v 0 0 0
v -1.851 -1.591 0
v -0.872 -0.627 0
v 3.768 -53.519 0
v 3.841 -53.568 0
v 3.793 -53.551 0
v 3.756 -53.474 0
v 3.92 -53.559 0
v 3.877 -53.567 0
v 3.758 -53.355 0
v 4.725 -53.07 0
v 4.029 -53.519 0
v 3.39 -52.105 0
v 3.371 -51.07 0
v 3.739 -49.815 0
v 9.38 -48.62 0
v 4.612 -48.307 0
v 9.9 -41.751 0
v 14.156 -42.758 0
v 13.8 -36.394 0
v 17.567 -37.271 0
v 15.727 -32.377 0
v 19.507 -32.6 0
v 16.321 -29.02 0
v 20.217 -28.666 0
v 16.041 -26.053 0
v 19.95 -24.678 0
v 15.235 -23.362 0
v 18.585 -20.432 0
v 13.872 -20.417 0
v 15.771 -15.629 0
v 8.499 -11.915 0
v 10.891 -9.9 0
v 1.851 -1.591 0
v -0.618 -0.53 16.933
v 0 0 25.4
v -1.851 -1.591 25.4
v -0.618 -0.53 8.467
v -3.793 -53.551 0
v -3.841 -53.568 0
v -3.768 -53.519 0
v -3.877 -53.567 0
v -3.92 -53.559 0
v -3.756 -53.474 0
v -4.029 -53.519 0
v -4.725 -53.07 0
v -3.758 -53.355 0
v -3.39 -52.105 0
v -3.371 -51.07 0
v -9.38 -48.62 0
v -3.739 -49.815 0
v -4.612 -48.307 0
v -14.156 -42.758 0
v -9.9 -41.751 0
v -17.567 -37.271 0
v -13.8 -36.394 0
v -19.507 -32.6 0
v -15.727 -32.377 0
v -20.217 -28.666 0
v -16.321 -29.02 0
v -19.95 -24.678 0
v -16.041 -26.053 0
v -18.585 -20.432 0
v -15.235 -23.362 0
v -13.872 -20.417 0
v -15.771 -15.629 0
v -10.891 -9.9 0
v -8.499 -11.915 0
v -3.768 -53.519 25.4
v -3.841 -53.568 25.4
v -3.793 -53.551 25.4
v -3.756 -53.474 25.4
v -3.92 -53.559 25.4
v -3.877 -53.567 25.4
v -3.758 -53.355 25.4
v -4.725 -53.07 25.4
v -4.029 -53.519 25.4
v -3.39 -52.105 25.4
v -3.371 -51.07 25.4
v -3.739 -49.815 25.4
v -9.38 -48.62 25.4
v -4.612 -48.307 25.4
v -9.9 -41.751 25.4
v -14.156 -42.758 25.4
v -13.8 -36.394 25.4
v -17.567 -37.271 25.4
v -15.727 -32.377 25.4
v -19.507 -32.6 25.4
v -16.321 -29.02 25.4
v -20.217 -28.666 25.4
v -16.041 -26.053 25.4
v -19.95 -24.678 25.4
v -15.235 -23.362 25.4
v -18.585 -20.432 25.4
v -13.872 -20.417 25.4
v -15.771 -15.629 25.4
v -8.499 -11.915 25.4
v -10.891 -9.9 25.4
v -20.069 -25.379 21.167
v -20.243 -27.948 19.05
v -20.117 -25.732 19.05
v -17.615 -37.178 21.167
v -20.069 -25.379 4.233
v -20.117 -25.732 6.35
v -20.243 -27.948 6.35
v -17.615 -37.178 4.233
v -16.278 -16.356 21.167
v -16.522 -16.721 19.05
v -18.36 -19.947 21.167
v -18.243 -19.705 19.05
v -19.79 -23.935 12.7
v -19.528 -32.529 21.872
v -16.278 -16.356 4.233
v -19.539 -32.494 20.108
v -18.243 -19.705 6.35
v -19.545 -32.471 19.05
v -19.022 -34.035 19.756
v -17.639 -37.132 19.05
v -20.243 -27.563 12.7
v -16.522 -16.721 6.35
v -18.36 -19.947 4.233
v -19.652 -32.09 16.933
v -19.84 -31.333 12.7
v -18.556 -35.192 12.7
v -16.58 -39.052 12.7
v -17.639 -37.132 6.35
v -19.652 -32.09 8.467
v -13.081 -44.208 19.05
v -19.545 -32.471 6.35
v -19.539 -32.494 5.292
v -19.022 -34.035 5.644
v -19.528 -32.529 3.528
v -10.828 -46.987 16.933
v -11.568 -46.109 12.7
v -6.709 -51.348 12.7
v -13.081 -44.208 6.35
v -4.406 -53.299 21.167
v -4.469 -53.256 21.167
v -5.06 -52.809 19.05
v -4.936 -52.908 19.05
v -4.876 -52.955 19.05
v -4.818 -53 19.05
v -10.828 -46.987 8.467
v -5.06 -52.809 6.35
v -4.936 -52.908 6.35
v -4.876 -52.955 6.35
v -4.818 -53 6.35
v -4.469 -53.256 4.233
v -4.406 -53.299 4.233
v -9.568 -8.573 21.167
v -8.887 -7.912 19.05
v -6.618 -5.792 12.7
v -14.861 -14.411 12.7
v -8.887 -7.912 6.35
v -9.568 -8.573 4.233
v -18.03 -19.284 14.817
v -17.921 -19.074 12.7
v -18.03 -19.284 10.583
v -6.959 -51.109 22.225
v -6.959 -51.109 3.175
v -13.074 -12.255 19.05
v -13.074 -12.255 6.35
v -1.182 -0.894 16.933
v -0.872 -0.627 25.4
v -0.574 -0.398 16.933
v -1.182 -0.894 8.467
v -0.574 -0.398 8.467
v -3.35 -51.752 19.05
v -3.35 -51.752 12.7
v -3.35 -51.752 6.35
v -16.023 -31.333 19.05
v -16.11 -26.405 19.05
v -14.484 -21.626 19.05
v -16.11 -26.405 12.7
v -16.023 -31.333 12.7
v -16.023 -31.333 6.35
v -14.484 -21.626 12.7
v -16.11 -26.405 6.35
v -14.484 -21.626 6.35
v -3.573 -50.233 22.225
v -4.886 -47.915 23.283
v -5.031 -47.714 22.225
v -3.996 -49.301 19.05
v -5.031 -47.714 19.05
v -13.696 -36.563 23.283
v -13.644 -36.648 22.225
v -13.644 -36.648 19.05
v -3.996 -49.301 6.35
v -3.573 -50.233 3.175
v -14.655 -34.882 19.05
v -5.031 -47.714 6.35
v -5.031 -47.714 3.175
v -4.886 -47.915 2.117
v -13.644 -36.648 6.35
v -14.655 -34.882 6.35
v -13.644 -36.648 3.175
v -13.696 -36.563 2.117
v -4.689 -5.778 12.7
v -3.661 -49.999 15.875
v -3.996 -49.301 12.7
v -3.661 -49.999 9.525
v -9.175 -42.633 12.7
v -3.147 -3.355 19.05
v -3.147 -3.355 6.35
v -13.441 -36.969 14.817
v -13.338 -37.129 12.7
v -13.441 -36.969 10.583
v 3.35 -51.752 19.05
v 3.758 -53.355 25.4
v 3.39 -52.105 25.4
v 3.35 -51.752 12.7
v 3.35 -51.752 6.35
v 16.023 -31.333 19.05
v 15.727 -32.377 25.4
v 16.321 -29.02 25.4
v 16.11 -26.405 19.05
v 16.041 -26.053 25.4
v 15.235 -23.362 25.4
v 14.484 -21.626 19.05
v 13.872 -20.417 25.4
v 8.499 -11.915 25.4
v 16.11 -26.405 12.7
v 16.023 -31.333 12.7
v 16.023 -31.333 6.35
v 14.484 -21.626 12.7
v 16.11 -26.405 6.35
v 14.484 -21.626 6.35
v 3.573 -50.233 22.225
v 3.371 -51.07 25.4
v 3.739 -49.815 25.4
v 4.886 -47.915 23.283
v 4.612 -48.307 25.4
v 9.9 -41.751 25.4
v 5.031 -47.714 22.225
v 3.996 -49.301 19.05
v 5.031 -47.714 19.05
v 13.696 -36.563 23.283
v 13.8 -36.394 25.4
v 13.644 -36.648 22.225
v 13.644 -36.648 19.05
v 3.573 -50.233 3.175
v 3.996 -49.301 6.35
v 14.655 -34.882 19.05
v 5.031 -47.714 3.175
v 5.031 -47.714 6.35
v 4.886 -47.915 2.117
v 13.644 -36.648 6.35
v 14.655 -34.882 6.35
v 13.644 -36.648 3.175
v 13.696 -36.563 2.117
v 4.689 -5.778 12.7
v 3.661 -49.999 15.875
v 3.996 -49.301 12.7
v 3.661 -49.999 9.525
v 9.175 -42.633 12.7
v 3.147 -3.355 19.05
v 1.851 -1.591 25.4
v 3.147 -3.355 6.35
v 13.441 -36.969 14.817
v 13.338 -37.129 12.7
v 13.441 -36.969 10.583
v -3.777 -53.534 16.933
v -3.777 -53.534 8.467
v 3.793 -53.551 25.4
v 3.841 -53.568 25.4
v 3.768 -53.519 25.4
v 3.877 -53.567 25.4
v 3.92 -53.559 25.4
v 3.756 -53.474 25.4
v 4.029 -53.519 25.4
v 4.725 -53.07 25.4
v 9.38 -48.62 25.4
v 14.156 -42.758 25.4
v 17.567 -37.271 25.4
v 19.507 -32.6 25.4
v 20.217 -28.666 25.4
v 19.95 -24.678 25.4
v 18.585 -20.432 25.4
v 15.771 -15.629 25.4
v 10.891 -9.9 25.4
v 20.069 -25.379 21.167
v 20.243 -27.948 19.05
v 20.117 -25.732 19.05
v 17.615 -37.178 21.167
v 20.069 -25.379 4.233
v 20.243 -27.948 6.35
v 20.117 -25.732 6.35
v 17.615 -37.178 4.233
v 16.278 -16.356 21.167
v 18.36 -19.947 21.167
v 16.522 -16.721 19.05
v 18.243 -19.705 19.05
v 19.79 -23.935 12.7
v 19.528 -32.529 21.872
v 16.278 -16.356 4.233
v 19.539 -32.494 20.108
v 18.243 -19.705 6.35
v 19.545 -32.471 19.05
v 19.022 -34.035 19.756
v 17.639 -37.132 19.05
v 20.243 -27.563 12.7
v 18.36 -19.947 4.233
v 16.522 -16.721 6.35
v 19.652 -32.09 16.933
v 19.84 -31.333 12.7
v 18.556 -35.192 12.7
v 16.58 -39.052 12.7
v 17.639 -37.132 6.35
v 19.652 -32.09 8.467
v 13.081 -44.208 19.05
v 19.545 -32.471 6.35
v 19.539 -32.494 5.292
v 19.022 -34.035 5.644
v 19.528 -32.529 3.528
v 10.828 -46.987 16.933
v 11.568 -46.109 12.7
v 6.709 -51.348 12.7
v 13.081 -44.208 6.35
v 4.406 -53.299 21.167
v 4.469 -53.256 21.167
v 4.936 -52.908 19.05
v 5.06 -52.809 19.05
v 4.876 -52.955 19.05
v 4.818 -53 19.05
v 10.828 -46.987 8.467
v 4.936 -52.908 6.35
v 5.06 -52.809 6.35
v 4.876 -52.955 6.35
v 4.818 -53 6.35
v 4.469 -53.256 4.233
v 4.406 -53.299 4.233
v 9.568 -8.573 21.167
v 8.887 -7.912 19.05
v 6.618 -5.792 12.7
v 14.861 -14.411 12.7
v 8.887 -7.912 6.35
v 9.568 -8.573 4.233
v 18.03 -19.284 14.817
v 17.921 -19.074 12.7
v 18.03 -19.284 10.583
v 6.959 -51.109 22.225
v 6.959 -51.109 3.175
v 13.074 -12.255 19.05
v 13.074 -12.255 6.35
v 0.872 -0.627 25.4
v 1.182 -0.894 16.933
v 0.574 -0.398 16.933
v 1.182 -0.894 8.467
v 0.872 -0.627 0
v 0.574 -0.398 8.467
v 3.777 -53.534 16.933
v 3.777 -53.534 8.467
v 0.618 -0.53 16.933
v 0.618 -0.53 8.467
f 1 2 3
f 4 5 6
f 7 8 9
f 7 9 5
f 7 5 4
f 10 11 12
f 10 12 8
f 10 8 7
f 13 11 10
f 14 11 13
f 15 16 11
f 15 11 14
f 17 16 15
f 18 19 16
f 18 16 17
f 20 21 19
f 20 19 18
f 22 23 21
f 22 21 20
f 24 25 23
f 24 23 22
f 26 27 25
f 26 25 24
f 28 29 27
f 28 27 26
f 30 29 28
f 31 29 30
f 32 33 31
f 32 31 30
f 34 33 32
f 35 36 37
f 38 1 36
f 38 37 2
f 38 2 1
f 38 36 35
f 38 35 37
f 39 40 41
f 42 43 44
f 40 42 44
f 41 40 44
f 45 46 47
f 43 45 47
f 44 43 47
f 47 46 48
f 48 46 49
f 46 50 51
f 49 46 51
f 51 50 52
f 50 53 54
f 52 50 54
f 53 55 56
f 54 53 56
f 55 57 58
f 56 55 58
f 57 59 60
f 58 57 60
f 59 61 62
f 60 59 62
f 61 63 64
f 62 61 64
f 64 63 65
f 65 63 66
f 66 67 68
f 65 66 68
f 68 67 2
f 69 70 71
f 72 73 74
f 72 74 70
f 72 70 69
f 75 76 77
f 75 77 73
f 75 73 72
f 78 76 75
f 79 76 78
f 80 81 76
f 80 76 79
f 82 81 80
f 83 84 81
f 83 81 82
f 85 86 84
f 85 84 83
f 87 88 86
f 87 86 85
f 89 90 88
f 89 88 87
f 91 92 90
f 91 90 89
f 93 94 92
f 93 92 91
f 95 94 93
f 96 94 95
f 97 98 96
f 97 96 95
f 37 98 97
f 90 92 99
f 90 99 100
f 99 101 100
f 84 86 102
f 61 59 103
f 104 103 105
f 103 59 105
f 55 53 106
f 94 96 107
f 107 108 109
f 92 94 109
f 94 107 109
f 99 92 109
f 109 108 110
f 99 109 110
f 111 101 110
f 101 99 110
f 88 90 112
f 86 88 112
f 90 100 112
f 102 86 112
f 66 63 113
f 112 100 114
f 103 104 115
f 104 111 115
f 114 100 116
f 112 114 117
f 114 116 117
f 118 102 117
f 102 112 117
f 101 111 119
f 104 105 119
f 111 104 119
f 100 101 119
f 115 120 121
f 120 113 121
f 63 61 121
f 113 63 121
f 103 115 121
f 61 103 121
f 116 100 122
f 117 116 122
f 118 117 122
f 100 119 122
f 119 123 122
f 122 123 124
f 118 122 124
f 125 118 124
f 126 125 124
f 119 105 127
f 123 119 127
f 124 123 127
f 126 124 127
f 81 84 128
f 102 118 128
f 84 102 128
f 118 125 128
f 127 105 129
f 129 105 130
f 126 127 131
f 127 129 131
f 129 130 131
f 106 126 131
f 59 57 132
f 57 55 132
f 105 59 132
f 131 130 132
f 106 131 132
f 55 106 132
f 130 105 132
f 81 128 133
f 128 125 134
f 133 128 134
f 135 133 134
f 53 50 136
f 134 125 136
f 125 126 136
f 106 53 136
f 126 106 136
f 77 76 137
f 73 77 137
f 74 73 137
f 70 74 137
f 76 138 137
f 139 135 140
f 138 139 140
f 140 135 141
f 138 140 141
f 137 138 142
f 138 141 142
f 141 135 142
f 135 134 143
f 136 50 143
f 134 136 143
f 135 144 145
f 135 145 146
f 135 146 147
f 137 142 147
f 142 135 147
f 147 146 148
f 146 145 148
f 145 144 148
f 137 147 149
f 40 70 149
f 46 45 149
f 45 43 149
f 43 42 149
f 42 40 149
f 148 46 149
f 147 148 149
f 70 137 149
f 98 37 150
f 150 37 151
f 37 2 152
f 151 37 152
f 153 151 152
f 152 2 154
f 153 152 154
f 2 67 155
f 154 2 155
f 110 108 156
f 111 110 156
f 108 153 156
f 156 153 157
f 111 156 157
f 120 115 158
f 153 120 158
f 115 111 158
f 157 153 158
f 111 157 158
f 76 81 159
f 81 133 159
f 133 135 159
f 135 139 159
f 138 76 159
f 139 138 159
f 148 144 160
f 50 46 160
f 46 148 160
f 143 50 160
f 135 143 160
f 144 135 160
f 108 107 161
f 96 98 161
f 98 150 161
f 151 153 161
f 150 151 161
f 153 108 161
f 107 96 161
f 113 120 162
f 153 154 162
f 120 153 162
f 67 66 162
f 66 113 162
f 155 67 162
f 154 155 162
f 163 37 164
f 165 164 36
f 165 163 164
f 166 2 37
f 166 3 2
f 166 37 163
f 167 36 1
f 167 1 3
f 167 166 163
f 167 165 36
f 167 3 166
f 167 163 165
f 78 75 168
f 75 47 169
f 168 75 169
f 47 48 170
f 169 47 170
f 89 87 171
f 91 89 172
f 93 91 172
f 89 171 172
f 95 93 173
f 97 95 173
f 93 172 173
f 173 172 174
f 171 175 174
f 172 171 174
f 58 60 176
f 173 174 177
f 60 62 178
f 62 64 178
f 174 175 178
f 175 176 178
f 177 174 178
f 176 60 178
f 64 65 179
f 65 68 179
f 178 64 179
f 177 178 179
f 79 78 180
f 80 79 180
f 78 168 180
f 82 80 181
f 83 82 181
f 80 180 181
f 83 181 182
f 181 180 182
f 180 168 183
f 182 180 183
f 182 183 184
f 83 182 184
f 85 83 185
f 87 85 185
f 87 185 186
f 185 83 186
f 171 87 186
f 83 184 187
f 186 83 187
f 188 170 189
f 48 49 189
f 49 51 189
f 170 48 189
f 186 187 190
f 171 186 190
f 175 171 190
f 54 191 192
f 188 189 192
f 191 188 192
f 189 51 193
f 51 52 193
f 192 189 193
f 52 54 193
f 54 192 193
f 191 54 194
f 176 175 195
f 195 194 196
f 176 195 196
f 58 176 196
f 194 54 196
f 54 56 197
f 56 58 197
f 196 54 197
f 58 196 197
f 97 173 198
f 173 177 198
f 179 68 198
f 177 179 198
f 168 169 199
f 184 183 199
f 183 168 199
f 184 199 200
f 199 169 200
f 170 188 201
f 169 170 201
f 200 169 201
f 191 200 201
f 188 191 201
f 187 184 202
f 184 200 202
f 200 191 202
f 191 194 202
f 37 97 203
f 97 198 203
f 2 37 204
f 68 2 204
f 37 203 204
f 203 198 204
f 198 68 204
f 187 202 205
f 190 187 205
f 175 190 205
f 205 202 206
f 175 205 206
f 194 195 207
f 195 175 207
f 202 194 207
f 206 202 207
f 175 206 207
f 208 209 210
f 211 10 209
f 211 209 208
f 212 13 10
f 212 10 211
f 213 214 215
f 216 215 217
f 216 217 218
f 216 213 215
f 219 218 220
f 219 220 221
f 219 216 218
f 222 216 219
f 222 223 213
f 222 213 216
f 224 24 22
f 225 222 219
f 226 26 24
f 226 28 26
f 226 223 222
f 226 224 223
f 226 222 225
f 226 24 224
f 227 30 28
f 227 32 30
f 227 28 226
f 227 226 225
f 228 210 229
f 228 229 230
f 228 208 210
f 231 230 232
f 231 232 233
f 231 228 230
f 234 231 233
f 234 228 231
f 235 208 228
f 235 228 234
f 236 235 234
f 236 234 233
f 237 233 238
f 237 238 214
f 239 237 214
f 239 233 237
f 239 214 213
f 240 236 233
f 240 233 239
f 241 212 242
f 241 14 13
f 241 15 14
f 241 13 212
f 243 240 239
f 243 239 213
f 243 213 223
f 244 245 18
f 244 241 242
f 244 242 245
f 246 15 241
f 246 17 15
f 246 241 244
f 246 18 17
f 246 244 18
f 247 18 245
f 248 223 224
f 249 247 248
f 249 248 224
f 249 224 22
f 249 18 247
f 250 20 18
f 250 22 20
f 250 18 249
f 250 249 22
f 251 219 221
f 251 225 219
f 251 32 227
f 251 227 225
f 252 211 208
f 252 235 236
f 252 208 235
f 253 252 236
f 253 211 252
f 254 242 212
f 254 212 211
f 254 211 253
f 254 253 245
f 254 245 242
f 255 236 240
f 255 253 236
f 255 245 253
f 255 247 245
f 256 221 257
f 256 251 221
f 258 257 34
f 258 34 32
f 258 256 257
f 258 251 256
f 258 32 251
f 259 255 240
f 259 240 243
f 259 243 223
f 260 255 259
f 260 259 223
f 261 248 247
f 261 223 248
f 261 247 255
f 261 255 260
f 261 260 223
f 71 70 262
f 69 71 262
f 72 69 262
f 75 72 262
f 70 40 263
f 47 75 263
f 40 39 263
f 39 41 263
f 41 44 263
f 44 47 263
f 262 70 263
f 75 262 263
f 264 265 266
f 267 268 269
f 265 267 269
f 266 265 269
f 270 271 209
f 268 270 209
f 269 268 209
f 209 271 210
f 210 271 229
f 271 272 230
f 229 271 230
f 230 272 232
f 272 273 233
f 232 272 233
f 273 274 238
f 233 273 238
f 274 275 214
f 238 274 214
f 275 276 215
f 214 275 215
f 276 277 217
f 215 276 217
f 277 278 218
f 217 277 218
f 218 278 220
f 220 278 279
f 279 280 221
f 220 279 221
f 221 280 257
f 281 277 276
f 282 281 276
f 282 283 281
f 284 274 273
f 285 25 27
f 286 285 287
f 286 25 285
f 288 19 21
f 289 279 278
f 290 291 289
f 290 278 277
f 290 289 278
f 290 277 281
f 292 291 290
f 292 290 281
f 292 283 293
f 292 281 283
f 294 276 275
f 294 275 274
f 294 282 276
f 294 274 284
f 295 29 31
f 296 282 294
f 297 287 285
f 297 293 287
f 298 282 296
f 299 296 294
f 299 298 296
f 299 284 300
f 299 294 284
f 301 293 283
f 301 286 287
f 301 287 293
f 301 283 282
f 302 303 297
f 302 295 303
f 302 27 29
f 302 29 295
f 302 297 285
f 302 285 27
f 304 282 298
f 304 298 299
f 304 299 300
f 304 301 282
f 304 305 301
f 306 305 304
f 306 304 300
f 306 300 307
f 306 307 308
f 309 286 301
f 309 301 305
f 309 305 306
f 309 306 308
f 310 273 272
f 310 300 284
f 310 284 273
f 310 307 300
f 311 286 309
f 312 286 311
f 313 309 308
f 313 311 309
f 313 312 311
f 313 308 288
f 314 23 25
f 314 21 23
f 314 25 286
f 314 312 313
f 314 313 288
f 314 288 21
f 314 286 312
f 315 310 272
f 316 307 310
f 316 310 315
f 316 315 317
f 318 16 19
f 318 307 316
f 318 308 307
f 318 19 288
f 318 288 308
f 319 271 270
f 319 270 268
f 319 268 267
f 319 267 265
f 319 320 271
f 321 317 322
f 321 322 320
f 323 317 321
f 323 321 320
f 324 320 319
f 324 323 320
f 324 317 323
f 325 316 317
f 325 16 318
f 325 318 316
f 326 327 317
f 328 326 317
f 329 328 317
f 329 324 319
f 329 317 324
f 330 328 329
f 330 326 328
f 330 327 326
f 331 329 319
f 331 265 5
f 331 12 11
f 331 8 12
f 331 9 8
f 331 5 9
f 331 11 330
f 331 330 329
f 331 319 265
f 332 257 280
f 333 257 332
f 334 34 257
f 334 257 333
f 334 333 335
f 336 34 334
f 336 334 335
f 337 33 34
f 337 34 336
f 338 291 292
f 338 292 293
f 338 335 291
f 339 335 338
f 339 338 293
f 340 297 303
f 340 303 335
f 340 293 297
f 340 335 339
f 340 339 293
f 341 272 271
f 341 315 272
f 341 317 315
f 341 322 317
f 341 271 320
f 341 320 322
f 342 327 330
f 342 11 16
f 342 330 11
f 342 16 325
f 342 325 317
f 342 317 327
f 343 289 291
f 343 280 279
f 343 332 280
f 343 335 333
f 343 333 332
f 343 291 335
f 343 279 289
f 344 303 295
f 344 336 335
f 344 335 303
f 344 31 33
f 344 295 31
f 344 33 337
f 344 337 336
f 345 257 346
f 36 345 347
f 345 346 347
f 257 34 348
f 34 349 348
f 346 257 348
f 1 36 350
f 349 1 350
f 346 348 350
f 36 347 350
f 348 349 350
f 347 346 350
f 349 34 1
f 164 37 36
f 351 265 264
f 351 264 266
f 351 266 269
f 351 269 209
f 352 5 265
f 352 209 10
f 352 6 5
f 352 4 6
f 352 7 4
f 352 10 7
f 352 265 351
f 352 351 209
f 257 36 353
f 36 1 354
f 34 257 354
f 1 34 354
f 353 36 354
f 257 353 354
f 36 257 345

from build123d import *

# Parameters (mm, degrees)
F1_DEPTH = 25.4


with BuildPart() as f1:
    # F0 (on Top) → F1 (new body)
    with BuildSketch(Plane.XY):
        with BuildLine():
            add(Edge.make_bspline(
                [(-3.7579423769, -53.3547353565), (-3.370457975, -52.3431925798), (-2.2307136518, -48.6091596866), (-22.7083935356, -31.2772210218), (-8.7878689347, -13.2919078478), (-3.4910903784, -3.5148630553), (-1.8507127268, -1.5906450197)],
                knots=[0.0078968627, 0.0078968627, 0.0078968627, 0.0078968627, 0.1199486261, 0.4081798355, 0.6827886283, 0.9042429926, 0.9042429926, 0.9042429926, 0.9042429926], degree=3))
            add(Edge.make_bspline(
                [(-1.8507127268, -1.5906450197), (-12.4612775627, -10.7373034613), (-31.4142116291, -28.4180189243), (-4.8924818793, -53.6630638335), (-3.840545658, -53.5682663321)],
                knots=[0.0280553669, 0.0280553669, 0.0280553669, 0.0280553669, 0.511801524, 0.9516625378, 0.9516625378, 0.9516625378, 0.9516625378], degree=3))
            add(Edge.make_bspline(
                [(-3.840545658, -53.5682663321), (-3.8128983, -53.4971450464), (-3.7852503909, -53.426023966), (-3.7579423769, -53.3547353565)],
                knots=[0, 0, 0, 0, 0.0078968627, 0.0078968627, 0.0078968627, 0.0078968627], degree=3))
        make_face()
        with BuildLine():
            add(Edge.make_bspline(
                [(-3.840545658, -53.5682663321), (-3.8128983, -53.4971450464), (-3.7852503909, -53.426023966), (-3.7579423769, -53.3547353565)],
                knots=[0, 0, 0, 0, 0.0078968627, 0.0078968627, 0.0078968627, 0.0078968627], degree=3))
            add(Edge.make_bspline(
                [(-3.840545658, -53.5682663321), (-3.7525739328, -53.5603385704), (-3.7455812113, -53.4676641407), (-3.7579423769, -53.3547353565)],
                knots=[0.9516625378, 0.9516625378, 0.9516625378, 0.9516625378, 0.9884474031, 0.9884474031, 0.9884474031, 0.9884474031], degree=3))
        make_face()
    extrude(amount=F1_DEPTH)


with BuildPart() as f1b:
    # F0 (on Top) → F1, piece 2 (new body)
    with BuildSketch(Plane.XY):
        with BuildLine():
            add(Edge.make_bspline(
                [(1.8507127268, -1.5906450197), (1.1414123911, -0.7586119221), (0.5675215582, -0.3828773849), (0, 0)],
                knots=[0.9042429926, 0.9042429926, 0.9042429926, 0.9042429926, 1, 1, 1, 1], degree=3))
            add(Edge.make_bspline(
                [(0, 0), (0.6176709325, -0.5300874741), (1.235341865, -1.0601749481), (1.8507127268, -1.5906450197)],
                knots=[0, 0, 0, 0, 0.0280553669, 0.0280553669, 0.0280553669, 0.0280553669], degree=3))
        make_face()
    extrude(amount=F1_DEPTH)


with BuildPart() as f1c:
    # F0 (on Top) → F1, piece 3 (new body)
    with BuildSketch(Plane.XY):
        with BuildLine():
            add(Edge.make_bspline(
                [(1.8507127268, -1.5906450197), (12.4612775627, -10.7373034613), (31.4142116291, -28.4180189243), (4.8924818793, -53.6630638335), (3.840545658, -53.5682663321)],
                knots=[0.0280553669, 0.0280553669, 0.0280553669, 0.0280553669, 0.511801524, 0.9516625378, 0.9516625378, 0.9516625378, 0.9516625378], degree=3))
            add(Edge.make_bspline(
                [(3.7579423769, -53.3547353565), (3.370457975, -52.3431925798), (2.2307136518, -48.6091596866), (22.7083935356, -31.2772210218), (8.7878689347, -13.2919078478), (3.4910903784, -3.5148630553), (1.8507127268, -1.5906450197)],
                knots=[0.0078968627, 0.0078968627, 0.0078968627, 0.0078968627, 0.1199486261, 0.4081798355, 0.6827886283, 0.9042429926, 0.9042429926, 0.9042429926, 0.9042429926], degree=3))
            add(Edge.make_bspline(
                [(3.840545658, -53.5682663321), (3.8128983, -53.4971450464), (3.7852503909, -53.426023966), (3.7579423769, -53.3547353565)],
                knots=[0, 0, 0, 0, 0.0078968627, 0.0078968627, 0.0078968627, 0.0078968627], degree=3))
        make_face()
        with BuildLine():
            add(Edge.make_bspline(
                [(3.840545658, -53.5682663321), (3.7525739328, -53.5603385704), (3.7455812113, -53.4676641407), (3.7579423769, -53.3547353565)],
                knots=[0.9516625378, 0.9516625378, 0.9516625378, 0.9516625378, 0.9884474031, 0.9884474031, 0.9884474031, 0.9884474031], degree=3))
            add(Edge.make_bspline(
                [(3.840545658, -53.5682663321), (3.8128983, -53.4971450464), (3.7852503909, -53.426023966), (3.7579423769, -53.3547353565)],
                knots=[0, 0, 0, 0, 0.0078968627, 0.0078968627, 0.0078968627, 0.0078968627], degree=3))
        make_face()
    extrude(amount=F1_DEPTH)


with BuildPart() as f1d:
    # F0 (on Top) → F1, piece 4 (new body)
    with BuildSketch(Plane.XY):
        with BuildLine():
            add(Edge.make_bspline(
                [(0, 0), (-0.6176709325, -0.5300874741), (-1.235341865, -1.0601749481), (-1.8507127268, -1.5906450197)],
                knots=[0, 0, 0, 0, 0.0280553669, 0.0280553669, 0.0280553669, 0.0280553669], degree=3))
            add(Edge.make_bspline(
                [(-1.8507127268, -1.5906450197), (-1.1414123911, -0.7586119221), (-0.5675215582, -0.3828773849), (0, 0)],
                knots=[0.9042429926, 0.9042429926, 0.9042429926, 0.9042429926, 1, 1, 1, 1], degree=3))
        make_face()
    extrude(amount=F1_DEPTH)


solid = Compound([f1.part, f1b.part, f1c.part, f1d.part])
